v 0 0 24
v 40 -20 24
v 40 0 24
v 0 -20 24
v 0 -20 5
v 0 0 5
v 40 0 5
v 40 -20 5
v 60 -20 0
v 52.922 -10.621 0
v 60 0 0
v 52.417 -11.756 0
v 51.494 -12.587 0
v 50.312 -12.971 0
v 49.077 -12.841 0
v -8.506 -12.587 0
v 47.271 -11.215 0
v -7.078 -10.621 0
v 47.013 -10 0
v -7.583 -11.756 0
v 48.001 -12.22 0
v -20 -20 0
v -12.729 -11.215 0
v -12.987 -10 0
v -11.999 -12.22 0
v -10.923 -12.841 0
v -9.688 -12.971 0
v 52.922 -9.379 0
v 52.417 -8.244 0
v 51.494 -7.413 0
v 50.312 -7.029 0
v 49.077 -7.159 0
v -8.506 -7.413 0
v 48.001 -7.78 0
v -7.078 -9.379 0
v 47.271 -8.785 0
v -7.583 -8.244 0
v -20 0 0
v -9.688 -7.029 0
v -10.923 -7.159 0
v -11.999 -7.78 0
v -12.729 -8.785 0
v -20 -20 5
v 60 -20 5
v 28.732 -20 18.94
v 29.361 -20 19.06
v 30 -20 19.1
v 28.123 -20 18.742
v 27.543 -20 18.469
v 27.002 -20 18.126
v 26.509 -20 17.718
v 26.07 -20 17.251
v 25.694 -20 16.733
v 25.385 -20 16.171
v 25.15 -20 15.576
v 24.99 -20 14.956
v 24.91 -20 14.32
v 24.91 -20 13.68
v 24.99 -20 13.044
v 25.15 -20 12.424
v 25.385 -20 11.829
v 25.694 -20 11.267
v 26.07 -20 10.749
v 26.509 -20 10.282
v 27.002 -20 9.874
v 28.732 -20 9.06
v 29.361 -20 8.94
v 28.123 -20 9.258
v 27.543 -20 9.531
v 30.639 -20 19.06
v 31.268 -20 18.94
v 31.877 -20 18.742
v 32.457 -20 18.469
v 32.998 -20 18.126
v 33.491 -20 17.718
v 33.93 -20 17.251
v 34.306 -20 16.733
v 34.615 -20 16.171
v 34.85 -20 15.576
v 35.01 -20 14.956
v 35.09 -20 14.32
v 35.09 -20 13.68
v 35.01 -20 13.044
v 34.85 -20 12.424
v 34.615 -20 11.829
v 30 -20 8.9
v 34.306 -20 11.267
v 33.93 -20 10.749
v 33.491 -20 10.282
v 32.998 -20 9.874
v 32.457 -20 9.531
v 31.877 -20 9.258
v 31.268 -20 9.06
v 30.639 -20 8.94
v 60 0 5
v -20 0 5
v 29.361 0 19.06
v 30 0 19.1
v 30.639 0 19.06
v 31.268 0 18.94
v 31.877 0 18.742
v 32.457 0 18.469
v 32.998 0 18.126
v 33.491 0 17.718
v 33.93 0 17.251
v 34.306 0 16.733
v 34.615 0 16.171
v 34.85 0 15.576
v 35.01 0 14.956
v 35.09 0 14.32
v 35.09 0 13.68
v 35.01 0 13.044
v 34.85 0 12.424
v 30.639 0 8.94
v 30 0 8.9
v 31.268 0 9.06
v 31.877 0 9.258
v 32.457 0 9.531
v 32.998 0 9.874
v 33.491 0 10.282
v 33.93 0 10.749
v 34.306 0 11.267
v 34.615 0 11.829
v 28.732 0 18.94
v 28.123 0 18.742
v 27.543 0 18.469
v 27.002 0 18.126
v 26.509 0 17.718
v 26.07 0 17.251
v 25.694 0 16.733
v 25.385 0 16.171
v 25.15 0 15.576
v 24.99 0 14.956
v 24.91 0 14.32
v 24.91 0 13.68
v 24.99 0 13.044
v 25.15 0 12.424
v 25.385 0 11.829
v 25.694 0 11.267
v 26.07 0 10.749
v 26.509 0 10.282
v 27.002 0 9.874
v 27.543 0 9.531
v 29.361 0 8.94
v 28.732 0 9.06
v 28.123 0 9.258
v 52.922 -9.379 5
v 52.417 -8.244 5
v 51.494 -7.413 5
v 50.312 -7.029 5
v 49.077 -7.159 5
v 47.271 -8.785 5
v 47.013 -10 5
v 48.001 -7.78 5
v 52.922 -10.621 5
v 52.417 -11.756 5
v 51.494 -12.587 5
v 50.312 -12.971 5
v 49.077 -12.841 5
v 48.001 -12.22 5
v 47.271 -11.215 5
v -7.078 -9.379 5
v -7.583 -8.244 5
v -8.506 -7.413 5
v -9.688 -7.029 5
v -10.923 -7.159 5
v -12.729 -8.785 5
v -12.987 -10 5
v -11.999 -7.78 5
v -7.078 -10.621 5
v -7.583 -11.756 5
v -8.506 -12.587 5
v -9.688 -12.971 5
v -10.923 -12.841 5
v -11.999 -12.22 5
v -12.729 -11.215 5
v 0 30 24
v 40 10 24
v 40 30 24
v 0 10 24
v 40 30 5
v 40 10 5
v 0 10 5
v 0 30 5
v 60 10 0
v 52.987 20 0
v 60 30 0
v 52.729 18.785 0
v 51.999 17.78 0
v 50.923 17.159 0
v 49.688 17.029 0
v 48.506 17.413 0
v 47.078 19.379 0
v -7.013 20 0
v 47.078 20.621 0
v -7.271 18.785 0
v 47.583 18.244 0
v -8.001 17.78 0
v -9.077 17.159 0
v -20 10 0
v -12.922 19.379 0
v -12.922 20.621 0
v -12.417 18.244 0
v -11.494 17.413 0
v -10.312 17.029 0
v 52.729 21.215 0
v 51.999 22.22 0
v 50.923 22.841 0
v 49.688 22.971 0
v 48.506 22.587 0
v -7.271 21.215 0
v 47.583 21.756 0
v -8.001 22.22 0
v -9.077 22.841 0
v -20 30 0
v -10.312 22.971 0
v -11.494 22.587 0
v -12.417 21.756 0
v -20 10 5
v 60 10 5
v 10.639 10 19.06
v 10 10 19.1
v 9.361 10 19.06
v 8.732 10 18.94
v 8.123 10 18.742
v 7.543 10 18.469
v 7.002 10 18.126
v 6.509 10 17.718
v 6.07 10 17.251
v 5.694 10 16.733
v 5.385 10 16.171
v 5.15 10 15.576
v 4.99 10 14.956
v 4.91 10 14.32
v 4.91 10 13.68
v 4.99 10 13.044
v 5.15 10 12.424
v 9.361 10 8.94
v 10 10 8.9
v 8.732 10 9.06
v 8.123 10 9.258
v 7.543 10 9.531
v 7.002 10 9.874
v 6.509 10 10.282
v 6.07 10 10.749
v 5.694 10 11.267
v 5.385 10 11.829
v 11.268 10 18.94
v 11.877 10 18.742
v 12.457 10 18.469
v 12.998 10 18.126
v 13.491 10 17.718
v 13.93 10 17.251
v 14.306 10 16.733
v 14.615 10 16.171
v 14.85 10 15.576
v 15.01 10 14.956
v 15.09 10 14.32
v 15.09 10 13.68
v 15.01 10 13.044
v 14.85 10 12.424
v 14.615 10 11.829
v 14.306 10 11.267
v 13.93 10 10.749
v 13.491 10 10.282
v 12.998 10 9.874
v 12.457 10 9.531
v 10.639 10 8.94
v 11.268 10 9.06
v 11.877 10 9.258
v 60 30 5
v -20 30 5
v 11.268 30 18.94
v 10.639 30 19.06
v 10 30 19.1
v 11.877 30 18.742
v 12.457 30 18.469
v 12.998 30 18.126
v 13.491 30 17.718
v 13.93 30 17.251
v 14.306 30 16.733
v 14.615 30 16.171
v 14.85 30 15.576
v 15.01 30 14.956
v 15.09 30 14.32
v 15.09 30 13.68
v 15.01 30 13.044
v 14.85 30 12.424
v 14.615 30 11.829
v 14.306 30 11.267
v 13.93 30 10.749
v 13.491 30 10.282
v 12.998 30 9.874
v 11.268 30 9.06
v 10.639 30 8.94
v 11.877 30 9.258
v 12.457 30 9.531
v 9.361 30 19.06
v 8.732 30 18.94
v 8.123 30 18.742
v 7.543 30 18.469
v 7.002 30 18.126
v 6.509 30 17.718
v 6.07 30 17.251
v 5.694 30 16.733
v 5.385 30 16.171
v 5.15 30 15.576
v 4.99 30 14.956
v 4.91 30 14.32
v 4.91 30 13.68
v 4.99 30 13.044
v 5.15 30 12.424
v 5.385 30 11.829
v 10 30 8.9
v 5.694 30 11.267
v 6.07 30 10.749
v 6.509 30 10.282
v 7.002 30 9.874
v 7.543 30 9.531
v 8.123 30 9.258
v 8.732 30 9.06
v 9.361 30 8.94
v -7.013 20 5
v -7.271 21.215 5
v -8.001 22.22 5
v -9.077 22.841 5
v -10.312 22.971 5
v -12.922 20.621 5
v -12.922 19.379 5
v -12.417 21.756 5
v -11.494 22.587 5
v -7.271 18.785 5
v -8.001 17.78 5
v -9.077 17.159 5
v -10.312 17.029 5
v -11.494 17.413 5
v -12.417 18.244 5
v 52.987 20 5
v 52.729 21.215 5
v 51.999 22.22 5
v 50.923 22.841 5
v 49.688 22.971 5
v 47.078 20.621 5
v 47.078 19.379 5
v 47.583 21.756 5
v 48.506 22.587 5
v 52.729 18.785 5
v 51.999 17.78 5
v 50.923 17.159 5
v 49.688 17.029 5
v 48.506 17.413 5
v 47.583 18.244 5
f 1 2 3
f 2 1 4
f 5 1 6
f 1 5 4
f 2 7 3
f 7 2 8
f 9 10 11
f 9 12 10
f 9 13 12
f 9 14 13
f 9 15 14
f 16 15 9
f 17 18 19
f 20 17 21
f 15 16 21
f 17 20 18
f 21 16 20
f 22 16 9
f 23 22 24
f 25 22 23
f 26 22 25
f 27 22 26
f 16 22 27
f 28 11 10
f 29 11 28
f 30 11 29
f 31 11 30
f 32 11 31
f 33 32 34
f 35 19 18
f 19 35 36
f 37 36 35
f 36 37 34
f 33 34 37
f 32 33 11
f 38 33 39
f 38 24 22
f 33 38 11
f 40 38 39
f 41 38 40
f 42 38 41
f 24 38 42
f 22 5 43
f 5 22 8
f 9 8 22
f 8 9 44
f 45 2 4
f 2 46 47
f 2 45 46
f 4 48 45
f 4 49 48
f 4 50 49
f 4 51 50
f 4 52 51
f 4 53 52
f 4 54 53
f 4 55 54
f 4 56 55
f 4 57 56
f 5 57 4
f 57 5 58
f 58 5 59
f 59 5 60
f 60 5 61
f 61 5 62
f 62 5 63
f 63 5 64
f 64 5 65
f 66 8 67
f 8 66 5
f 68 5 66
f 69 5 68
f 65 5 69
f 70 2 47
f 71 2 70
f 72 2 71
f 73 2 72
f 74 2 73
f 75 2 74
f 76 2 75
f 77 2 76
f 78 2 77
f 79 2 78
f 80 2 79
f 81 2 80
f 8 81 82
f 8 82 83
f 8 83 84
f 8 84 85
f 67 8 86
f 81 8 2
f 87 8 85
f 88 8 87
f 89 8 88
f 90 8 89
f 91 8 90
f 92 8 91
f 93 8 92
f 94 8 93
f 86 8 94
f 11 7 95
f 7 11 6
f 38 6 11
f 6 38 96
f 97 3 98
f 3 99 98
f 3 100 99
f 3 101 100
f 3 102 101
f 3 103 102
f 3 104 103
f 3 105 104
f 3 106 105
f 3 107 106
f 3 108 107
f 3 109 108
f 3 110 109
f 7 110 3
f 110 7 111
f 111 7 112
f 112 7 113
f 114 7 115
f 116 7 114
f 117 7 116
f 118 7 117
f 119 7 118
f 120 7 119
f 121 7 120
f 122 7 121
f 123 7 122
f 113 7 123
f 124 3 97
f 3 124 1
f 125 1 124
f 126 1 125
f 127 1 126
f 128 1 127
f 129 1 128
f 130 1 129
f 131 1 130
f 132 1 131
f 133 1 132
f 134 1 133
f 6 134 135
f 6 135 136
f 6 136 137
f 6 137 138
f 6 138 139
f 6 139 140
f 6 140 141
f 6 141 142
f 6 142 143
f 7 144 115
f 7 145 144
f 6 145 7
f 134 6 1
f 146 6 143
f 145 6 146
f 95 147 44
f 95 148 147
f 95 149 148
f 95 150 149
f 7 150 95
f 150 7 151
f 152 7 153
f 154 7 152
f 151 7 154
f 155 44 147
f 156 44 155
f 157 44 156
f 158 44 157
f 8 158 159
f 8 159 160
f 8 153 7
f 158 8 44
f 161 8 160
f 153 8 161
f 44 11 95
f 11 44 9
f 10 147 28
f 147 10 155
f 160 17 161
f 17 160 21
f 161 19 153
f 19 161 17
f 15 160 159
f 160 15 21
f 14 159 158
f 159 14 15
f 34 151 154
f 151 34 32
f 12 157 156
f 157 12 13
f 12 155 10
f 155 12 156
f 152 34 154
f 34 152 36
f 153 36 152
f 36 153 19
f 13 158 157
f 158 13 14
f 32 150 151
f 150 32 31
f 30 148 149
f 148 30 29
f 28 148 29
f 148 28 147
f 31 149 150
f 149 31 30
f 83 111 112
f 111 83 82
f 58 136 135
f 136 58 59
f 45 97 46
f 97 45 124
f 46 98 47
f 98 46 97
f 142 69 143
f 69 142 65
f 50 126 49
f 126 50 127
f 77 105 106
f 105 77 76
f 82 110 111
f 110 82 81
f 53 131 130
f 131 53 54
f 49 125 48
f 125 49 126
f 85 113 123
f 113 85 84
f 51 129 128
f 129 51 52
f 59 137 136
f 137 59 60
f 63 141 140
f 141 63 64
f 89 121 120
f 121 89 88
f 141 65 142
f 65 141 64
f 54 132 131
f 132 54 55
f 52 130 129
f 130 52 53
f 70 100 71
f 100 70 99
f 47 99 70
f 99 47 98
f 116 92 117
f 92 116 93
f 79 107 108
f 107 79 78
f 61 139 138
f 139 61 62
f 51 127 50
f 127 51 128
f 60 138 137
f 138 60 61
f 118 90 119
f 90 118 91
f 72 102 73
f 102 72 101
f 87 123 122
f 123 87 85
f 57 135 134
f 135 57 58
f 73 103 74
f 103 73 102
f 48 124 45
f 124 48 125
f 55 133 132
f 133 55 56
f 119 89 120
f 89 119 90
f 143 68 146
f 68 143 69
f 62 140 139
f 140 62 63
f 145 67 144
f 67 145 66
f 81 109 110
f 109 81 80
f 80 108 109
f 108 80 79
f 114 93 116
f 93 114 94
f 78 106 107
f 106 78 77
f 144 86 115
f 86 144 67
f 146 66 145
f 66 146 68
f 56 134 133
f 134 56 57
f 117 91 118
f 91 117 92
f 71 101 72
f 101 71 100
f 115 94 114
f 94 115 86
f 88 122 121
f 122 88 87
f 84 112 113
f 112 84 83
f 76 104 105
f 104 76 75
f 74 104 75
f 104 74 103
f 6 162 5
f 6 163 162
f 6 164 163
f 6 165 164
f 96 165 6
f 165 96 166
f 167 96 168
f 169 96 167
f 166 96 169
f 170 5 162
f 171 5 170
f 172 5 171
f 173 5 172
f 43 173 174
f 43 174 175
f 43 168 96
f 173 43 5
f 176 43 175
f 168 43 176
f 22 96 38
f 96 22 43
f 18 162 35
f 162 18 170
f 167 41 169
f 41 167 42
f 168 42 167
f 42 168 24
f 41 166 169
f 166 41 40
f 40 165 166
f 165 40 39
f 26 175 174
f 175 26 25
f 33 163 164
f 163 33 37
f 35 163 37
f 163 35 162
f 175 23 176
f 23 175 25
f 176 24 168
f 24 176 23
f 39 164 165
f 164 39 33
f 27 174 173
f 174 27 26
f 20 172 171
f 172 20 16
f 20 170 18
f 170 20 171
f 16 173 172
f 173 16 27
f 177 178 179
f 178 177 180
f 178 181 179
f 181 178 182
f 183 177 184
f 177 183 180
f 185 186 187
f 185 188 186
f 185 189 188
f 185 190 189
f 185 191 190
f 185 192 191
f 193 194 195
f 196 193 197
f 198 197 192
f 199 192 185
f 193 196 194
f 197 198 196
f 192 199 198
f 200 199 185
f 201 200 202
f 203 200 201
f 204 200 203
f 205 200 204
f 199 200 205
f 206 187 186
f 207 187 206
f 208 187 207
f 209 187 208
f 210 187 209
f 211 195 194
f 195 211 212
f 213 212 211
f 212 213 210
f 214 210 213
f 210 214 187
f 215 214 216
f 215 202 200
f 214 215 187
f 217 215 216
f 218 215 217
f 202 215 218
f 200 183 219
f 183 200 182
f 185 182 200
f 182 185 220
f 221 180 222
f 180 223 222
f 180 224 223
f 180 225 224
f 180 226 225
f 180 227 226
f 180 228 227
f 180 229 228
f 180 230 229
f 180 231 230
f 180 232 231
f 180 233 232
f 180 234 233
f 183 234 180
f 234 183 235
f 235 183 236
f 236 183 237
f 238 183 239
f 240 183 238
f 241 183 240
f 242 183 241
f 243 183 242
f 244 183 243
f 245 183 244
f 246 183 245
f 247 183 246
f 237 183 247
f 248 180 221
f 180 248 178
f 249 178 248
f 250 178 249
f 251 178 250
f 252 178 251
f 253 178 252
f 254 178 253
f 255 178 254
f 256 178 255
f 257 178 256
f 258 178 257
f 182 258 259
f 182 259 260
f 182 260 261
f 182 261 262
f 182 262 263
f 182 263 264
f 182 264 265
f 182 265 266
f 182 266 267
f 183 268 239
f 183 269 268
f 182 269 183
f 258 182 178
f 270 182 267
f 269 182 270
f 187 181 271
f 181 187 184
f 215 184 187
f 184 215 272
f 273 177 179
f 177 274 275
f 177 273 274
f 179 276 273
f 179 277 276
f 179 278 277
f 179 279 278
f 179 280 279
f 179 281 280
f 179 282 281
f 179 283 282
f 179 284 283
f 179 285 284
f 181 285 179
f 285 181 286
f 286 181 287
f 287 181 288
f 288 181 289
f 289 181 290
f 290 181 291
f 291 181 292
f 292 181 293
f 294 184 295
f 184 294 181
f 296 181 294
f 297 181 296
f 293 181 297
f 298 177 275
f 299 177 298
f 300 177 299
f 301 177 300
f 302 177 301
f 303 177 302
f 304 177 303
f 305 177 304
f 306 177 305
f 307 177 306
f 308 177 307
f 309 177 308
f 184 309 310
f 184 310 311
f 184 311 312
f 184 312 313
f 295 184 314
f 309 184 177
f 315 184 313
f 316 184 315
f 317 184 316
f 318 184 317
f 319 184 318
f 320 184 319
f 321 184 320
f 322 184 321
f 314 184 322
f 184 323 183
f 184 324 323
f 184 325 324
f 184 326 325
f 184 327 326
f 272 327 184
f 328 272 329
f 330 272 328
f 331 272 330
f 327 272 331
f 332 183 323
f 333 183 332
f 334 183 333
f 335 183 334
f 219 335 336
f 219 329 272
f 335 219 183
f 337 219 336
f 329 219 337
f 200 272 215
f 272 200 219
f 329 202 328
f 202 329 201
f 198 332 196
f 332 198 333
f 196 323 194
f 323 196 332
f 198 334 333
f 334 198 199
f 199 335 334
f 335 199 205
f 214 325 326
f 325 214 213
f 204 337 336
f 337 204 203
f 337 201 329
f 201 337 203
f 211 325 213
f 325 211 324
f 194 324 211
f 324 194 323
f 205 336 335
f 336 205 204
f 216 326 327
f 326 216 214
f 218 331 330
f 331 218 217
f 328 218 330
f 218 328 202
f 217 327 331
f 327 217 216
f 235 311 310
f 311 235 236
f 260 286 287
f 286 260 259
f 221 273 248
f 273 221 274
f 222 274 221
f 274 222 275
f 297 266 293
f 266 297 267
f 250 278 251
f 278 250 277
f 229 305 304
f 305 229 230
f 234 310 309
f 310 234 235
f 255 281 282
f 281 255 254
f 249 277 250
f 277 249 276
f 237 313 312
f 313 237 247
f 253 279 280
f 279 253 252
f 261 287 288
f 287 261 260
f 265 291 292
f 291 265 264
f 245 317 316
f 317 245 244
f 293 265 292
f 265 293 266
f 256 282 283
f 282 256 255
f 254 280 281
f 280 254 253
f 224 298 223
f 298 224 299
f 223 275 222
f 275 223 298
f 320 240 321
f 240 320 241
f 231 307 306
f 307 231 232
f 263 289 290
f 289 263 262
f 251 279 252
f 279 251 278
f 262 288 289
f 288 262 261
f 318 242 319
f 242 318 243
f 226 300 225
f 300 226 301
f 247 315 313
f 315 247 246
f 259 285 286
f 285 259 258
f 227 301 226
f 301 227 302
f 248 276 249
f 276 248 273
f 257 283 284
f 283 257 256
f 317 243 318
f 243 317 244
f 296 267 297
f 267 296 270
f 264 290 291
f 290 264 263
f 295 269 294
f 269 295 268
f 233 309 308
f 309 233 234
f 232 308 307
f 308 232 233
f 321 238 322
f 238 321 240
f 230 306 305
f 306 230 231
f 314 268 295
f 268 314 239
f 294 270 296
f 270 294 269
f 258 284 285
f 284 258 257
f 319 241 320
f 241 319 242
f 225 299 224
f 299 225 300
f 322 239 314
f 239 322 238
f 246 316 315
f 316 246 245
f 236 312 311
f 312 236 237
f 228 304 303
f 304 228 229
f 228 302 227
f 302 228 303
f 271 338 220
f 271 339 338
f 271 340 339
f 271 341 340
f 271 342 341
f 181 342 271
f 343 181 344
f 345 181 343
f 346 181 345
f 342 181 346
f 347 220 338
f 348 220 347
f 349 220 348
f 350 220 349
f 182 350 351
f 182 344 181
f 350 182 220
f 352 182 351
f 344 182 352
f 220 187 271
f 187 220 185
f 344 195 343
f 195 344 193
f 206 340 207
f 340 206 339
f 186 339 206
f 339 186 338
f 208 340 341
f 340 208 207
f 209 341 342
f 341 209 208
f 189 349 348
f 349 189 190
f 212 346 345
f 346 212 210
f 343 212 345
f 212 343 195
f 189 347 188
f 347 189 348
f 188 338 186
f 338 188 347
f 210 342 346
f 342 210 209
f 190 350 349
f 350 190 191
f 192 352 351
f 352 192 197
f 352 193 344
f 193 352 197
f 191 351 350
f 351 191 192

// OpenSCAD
// file: sub_front_pulleys.scad
include <nuts_and_bolts.scad>;
include <generals.scad>;

pulley_plate_x = 45;
pulley_plate_y = 28;

pulley_arm_x = pulley_plate_x + alu_x;
pulley_arm_y = pulley_plate_y + alu_x;

module front_pulley(lower = false, left = false)
{
    echo("FP:", lower, left);
	difference()
	{
		union()
		{
			translate([-alu_x, 0, 0]) cube([pulley_arm_x, alu_x, wall]);
			translate([-alu_x, -pulley_arm_y+alu_x, 0]) cube([alu_x, pulley_arm_y, wall]);
			translate([0, -pulley_plate_y, lower ? 0 : wall-thin_wall ]) cube([pulley_plate_x, pulley_plate_y, lower ? wall : thin_wall ]); //lower ? 0 : wall-thin_wall 

        /*    if (lower)
            {
                if(left)
                {
                    translate([hole_dist_1, -hole_dist_1, wall-1]) cylinder(h=alu_x+(wall-thin_wall)-bearing_pulley_h-2*belt_z_offset+1, d=pulley_b_d);
                }
                
                if (!left)
                {
                    translate([hole_dist_2+hole_x_offset, -hole_dist_2, wall-1]) cylinder(h=pulley_s_base_h+1, d=pulley_b_d-3.4);
                }
            }
        */
            if (!lower)
            {
                if(left)
                {
                    translate([hole_dist_2+hole_x_offset, -hole_dist_2, -(alu_x-bearing_pulley_h-2*belt_z_offset)]) cylinder(h=alu_x+wall-thin_wall-bearing_pulley_h-2*belt_z_offset+1, d=pulley_b_d-3.4);
                }
                
                if (!left)
                {
                    translate([hole_dist_1, -hole_dist_1, -(alu_x-bearing_pulley_h-2*belt_z_offset)]) cylinder(h=alu_x+thin_wall-bearing_pulley_h-2*belt_z_offset+1, d=pulley_b_d);

                    translate([hole_dist_2+hole_x_offset, -hole_dist_2, -(alu_x-bearing_pulley_h-2*belt_z_offset-pulley_s_base_h)]) cylinder(h=alu_x+wall-thin_wall-bearing_pulley_h-2*belt_z_offset-pulley_s_base_h+1, d=pulley_b_d-3.4);
                }
            }

		}

		translate([(pulley_arm_x - alu_x)*2/3, alu_x/2, -20]) rotate([0, 0, 0]) boltHole(size=bolt,length=40);
		translate([(pulley_arm_x - alu_x)*1/3, alu_x/2, -20]) rotate([0, 0, 0]) boltHole(size=bolt,length=40);
		translate([-alu_x/2, -(pulley_arm_y - alu_x)*2/3-1, -20]) rotate([0, 0, 0]) boltHole(size=bolt,length=40);
		translate([-alu_x/2, -(pulley_arm_y - alu_x)*1/4, -20]) rotate([0, 0, 0]) boltHole(size=bolt,length=40);
		
		translate([hole_dist_1, -hole_dist_1, -20]) boltHole(size=3, length=40);
		translate([hole_dist_2+hole_x_offset, -hole_dist_2, -20]) boltHole(size=3,length=40);
        
		if (lower)
		{
			translate([-alu_x-2+0.1, -0.1, -1]) cube([alu_x+2, alu_x+2, wall+2]);
		}
	}

}

/*
is_left = false;

front_pulley(false, is_left);

translate([0, 0, -alu_x-wall]) front_pulley(true, is_left);
*/
///color([0, 0.2, 0]) translate([hole_dist_1,-hole_dist_1,-pulley_height+2]) pulley();
//color([0, 0.4, 0]) translate([hole_dist_2+hole_x_offset,-hole_dist_2,-4]) mirror([0,0,1])pulley();

//color([0.5,0,0]) translate([30, -40, -alu_x]) cube([20,20,pulley_height+4]);
//color([0,0,0]) translate([5, 10, -alu_x]) cube([20,20,alu_x]);
// file: sub_rod_support.scad
include <nuts_and_bolts.scad>;
include <generals.scad>;

include <sub_front_pulleys.scad>;

y_sup_body_height = alu_x / 2 + wall + y_from_top;
y_sup_body_width = alu_x /2 + y_from_side;
y_back_spacing = -wall;

y_sup_arm_length_x = y_sup_body_width + alu_x;
y_sup_arm_length_z = y_sup_body_height + alu_x;

module rod_support(front = true, support_width = alu_x, support_height = y_sup_body_height, with_bottom = true)
{
	mirror([0, front ? 0 : 1, 0])
	difference()
	{
		union()
		{
			translate([0, 0, -support_height]) cube([y_sup_body_width, alu_x, support_height]);
			
			if (with_bottom)
			{
				translate([0, 0, -y_sup_arm_length_z]) cube([wall, support_width, y_sup_arm_length_z]);
			}
			else
			{
				translate([0, 0, -support_height]) cube([y_sup_body_width + alu_x, alu_x, wall]);
			}
		}

		translate([y_from_side, alu_x+1, -y_from_top-wall]) rotate([90, 0, 0]) cylinder(d = rod_dia + clearance, h = alu_x+2);

		if (with_bottom)
		{
			translate([6, alu_x/2, -y_sup_arm_length_z+(y_sup_arm_length_z-support_height)/2]) rotate([0, -90, 0]) boltHole(size=bolt,length=40);
		}
		else
		{
			translate([y_sup_body_width + alu_x/2, alu_x/2, -support_height-0.5]) rotate([0, 0, 0]) boltHole(bolt, length=wall+1);	
		}
	}
}

//rod_support(support_width=alu_x, with_bottom = true);
//translate([0, 60, 0]) rod_support(false);
// file: nuts_and_bolts.scad
// Copyright 2010 D1plo1d

// This library is dual licensed under the GPL 3.0 and the GNU Lesser General Public License as per http://creativecommons.org/licenses/LGPL/2.1/ .

//testNutsAndBolts();

module SKIPtestNutsAndBolts()
{
	$fn = 360;
	translate([0,15])nutHole(3);
	boltHole(3, length= 30);
}

MM = "mm";
INCH = "inch"; //Not yet supported

//Based on: http://www.roymech.co.uk/Useful_Tables/Screws/Hex_Screws.htm
METRIC_NUT_AC_WIDTHS =
[
	-1, //0 index is not used but reduces computation
	-1,
	-1,
	6.90,//m3
	8.10,//m4
	9.20,//m5
	11.50,//m6
	-1,
	15.50,//m8
	-1,
	19.60,//m10
	-1,
	22.10,//m12
	-1,
	-1,
	-1,
	27.70,//m16
	-1,
	-1,
	-1,
	34.60,//m20
	-1,
	-1,
	-1,
	41.60,//m24
	-1,
	-1,
	-1,
	-1,
	-1,
	53.1,//m30
	-1,
	-1,
	-1,
	-1,
	-1,
	63.5//m36
];
METRIC_NUT_THICKNESS =
[
	-1, //0 index is not used but reduces computation
	-1,
	-1,
	2.40,//m3
	3.20,//m4
	4.00,//m5
	5.00,//m6
	-1,
	6.50,//m8
	-1,
	8.00,//m10
	-1,
	10.00,//m12
	-1,
	-1,
	-1,
	13.00,//m16
	-1,
	-1,
	-1,
	16.00//m20
	-1,
	-1,
	-1,
	19.00,//m24
	-1,
	-1,
	-1,
	-1,
	-1,
	24.00,//m30
	-1,
	-1,
	-1,
	-1,
	-1,
	29.00//m36
];

COURSE_METRIC_BOLT_MAJOR_THREAD_DIAMETERS =
[//based on max values
	-1, //0 index is not used but reduces computation
	-1,
	-1,
	2.98,//m3
	3.978,//m4
	4.976,//m5
	5.974,//m6
	-1,
	7.972,//m8
	-1,
	9.968,//m10
	-1,
	11.966,//m12
	-1,
	-1,
	-1,
	15.962,//m16
	-1,
	-1,
	-1,
	19.958,//m20
	-1,
	-1,
	-1,
	23.952,//m24
	-1,
	-1,
	-1,
	-1,
	-1,
	29.947,//m30
	-1,
	-1,
	-1,
	-1,
	-1,
	35.940//m36
];

module nutHole(size, units=MM, tolerance = +0.0001, proj = -1)
{
	//takes a metric screw/nut size and looksup nut dimensions
	radius = METRIC_NUT_AC_WIDTHS[size]/2+tolerance;
	height = METRIC_NUT_THICKNESS[size]+tolerance;
	if (proj == -1)
	{
		cylinder(r= radius, h=height, $fn = 6, center=[0,0]);
	}
	if (proj == 1)
	{
		circle(r= radius, $fn = 6);
	}
	if (proj == 2)
	{
		translate([-radius/2, 0])
			square([radius*2, height]);
	}
}

module boltHole(size, units=MM, length, tolerance = +0.0001, proj = -1)
{
	radius = COURSE_METRIC_BOLT_MAJOR_THREAD_DIAMETERS[size]/2+tolerance;
//TODO: proper screw cap values
	capHeight = METRIC_NUT_THICKNESS[size]+tolerance; //METRIC_BOLT_CAP_HEIGHTS[size]+tolerance;
	capRadius = METRIC_NUT_AC_WIDTHS[size]/2+tolerance; //METRIC_BOLT_CAP_RADIUS[size]+tolerance;

	if (proj == -1)
	{
	translate([0, 0, -capHeight])
		cylinder(r= capRadius, h=capHeight, $fn=15);
	cylinder(r = radius, h = length, $fn=15);
	}
	if (proj == 1)
	{
		circle(r = radius);
	}
	if (proj == 2)
	{
		translate([-capRadius/2, -capHeight])
			square([capRadius*2, capHeight]);
		square([radius*2, length]);
	}
}

module boltHoleEx(size, units=MM, length, tolerance = +0.0001, shift_x=0, shift_y=0)
{
	radius = COURSE_METRIC_BOLT_MAJOR_THREAD_DIAMETERS[size]/2+tolerance;
//TODO: proper screw cap values
	capHeight = METRIC_NUT_THICKNESS[size]+tolerance; //METRIC_BOLT_CAP_HEIGHTS[size]+tolerance;
	capRadius = METRIC_NUT_AC_WIDTHS[size]/2+tolerance; //METRIC_BOLT_CAP_RADIUS[size]+tolerance;

	hull()
	{
		translate([0, 0, -capHeight]) cylinder(r= capRadius, h=capHeight, $fn=15);
		translate([shift_x, shift_y, -capHeight]) cylinder(r= capRadius, h=capHeight, $fn=15);
	}

	hull()
	{
		cylinder(r = radius, h = length, $fn=15);
		translate([shift_x, shift_y, 0]) cylinder(r = radius, h = length, $fn=15);
	}
}

//boltHoleEx(3, length=6);
// main file
include <nuts_and_bolts.scad>;
include <generals.scad>;

include <sub_rod_support.scad>;
include <sub_front_pulleys.scad>;

y_sup_height_back = y_sup_body_height + 20;

module back_rod_support()
{
	difference()
	{
		union()
		{
			translate([0, -alu_x, -1]) cube([wall, alu_x, alu_x+1]);
			translate([0, 0, 0]) rod_support(front = false, with_bottom = true); //, support_width=wall + motor_from_side_y + nema17_side+alu_x+wall_clearance - alu_x);

		}

		translate([wall+0.5, -alu_x/2, alu_x/2]) rotate([0, -90, 0]) boltHole(bolt, length=wall+1);
	}
}

rotate([0, -90, 0]) back_rod_support();

translate([y_sup_height_back-alu_x, alu_x+10, 0]) rotate([0, 90, 0]) mirror([1, 0, 0]) back_rod_support();
